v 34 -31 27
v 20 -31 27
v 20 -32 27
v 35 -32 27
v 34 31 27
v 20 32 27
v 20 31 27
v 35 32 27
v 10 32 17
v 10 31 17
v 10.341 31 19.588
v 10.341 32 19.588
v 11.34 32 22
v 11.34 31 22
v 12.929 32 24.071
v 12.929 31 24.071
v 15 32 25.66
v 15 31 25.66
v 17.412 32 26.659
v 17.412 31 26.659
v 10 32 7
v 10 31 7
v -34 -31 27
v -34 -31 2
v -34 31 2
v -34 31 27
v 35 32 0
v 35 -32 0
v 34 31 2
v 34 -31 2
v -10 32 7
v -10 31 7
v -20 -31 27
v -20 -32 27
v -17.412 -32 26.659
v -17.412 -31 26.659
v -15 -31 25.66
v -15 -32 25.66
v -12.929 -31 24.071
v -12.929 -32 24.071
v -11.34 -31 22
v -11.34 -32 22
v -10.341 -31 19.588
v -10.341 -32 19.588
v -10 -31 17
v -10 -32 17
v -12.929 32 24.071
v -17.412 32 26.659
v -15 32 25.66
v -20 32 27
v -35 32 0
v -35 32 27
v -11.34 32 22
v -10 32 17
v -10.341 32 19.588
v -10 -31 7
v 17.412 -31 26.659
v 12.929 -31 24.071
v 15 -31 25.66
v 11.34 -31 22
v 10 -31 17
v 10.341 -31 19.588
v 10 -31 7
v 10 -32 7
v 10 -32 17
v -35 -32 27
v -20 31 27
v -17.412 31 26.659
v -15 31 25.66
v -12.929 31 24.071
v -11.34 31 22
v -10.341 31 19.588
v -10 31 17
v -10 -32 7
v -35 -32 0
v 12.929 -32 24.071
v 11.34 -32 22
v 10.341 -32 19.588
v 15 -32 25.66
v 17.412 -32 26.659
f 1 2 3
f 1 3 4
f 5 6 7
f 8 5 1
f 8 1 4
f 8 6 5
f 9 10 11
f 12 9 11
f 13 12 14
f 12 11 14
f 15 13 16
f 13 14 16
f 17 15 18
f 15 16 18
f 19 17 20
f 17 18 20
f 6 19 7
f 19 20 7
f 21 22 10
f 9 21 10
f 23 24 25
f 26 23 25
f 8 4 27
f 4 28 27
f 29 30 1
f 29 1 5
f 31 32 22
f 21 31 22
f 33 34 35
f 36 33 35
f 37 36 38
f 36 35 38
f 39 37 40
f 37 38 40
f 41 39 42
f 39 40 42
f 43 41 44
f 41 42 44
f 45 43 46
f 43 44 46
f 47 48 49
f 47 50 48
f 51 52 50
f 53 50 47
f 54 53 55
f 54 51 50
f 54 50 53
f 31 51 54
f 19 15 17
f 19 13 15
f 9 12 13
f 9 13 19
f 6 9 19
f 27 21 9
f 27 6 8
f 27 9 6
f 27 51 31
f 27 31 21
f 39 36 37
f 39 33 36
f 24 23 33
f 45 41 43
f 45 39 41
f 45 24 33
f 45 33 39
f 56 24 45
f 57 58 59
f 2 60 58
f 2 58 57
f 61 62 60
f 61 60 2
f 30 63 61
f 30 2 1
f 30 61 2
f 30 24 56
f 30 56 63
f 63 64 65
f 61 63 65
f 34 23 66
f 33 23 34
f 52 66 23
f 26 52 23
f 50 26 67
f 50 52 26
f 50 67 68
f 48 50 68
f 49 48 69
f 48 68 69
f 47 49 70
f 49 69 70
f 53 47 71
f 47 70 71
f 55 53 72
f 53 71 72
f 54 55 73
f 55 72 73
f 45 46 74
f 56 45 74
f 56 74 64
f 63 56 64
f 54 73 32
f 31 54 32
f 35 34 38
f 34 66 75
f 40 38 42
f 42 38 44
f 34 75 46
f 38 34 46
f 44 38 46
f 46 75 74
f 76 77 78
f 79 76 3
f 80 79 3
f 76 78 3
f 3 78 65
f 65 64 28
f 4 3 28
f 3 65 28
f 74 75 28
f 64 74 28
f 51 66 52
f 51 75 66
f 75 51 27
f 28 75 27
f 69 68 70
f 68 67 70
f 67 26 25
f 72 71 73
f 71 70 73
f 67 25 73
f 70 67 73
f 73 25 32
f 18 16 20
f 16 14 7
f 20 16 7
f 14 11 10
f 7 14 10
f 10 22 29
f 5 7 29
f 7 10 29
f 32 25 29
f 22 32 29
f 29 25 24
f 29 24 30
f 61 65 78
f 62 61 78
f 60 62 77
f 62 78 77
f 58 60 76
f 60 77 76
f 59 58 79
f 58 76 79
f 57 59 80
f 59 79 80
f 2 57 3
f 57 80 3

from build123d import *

# Parameters (mm, degrees)
F0_W     = 70
F0_H     = 64
F1_DEPTH = 2
F2_W     = 70
F2_H     = 64
F2_W_2   = 68
F2_H_2   = 62
F3_DEPTH = 25
F5_DEPTH = 125


with BuildPart() as f1:
    # F0 (on Top) → F1 (new body)
    with BuildSketch(Plane.XY):
        Rectangle(F0_W, F0_H)
    extrude(amount=F1_DEPTH)

    # F2 (on face) → F3 (join)
    with BuildSketch(Plane.XY.offset(2)):
        Rectangle(F2_W, F2_H)
        Rectangle(F2_W_2, F2_H_2, mode=Mode.SUBTRACT)
    extrude(amount=F3_DEPTH)

    # F4 (on face) → F5 (cut)
    with BuildSketch(Plane.XZ.offset(32)):
        with BuildLine():
            Line((-10, 7), (0, 7))
            Line((0, 7), (10, 7))
            Line((10, 7), (10, 17))
            ThreePointArc((10, 17), (12.928932, 24.071068), (20, 27))
            Line((20, 27), (-20, 27))
            ThreePointArc((-20, 27), (-12.928932, 24.071068), (-10, 17))
            Line((-10, 17), (-10, 7))
        make_face()
    extrude(amount=-F5_DEPTH, mode=Mode.SUBTRACT)


solid = f1.part
